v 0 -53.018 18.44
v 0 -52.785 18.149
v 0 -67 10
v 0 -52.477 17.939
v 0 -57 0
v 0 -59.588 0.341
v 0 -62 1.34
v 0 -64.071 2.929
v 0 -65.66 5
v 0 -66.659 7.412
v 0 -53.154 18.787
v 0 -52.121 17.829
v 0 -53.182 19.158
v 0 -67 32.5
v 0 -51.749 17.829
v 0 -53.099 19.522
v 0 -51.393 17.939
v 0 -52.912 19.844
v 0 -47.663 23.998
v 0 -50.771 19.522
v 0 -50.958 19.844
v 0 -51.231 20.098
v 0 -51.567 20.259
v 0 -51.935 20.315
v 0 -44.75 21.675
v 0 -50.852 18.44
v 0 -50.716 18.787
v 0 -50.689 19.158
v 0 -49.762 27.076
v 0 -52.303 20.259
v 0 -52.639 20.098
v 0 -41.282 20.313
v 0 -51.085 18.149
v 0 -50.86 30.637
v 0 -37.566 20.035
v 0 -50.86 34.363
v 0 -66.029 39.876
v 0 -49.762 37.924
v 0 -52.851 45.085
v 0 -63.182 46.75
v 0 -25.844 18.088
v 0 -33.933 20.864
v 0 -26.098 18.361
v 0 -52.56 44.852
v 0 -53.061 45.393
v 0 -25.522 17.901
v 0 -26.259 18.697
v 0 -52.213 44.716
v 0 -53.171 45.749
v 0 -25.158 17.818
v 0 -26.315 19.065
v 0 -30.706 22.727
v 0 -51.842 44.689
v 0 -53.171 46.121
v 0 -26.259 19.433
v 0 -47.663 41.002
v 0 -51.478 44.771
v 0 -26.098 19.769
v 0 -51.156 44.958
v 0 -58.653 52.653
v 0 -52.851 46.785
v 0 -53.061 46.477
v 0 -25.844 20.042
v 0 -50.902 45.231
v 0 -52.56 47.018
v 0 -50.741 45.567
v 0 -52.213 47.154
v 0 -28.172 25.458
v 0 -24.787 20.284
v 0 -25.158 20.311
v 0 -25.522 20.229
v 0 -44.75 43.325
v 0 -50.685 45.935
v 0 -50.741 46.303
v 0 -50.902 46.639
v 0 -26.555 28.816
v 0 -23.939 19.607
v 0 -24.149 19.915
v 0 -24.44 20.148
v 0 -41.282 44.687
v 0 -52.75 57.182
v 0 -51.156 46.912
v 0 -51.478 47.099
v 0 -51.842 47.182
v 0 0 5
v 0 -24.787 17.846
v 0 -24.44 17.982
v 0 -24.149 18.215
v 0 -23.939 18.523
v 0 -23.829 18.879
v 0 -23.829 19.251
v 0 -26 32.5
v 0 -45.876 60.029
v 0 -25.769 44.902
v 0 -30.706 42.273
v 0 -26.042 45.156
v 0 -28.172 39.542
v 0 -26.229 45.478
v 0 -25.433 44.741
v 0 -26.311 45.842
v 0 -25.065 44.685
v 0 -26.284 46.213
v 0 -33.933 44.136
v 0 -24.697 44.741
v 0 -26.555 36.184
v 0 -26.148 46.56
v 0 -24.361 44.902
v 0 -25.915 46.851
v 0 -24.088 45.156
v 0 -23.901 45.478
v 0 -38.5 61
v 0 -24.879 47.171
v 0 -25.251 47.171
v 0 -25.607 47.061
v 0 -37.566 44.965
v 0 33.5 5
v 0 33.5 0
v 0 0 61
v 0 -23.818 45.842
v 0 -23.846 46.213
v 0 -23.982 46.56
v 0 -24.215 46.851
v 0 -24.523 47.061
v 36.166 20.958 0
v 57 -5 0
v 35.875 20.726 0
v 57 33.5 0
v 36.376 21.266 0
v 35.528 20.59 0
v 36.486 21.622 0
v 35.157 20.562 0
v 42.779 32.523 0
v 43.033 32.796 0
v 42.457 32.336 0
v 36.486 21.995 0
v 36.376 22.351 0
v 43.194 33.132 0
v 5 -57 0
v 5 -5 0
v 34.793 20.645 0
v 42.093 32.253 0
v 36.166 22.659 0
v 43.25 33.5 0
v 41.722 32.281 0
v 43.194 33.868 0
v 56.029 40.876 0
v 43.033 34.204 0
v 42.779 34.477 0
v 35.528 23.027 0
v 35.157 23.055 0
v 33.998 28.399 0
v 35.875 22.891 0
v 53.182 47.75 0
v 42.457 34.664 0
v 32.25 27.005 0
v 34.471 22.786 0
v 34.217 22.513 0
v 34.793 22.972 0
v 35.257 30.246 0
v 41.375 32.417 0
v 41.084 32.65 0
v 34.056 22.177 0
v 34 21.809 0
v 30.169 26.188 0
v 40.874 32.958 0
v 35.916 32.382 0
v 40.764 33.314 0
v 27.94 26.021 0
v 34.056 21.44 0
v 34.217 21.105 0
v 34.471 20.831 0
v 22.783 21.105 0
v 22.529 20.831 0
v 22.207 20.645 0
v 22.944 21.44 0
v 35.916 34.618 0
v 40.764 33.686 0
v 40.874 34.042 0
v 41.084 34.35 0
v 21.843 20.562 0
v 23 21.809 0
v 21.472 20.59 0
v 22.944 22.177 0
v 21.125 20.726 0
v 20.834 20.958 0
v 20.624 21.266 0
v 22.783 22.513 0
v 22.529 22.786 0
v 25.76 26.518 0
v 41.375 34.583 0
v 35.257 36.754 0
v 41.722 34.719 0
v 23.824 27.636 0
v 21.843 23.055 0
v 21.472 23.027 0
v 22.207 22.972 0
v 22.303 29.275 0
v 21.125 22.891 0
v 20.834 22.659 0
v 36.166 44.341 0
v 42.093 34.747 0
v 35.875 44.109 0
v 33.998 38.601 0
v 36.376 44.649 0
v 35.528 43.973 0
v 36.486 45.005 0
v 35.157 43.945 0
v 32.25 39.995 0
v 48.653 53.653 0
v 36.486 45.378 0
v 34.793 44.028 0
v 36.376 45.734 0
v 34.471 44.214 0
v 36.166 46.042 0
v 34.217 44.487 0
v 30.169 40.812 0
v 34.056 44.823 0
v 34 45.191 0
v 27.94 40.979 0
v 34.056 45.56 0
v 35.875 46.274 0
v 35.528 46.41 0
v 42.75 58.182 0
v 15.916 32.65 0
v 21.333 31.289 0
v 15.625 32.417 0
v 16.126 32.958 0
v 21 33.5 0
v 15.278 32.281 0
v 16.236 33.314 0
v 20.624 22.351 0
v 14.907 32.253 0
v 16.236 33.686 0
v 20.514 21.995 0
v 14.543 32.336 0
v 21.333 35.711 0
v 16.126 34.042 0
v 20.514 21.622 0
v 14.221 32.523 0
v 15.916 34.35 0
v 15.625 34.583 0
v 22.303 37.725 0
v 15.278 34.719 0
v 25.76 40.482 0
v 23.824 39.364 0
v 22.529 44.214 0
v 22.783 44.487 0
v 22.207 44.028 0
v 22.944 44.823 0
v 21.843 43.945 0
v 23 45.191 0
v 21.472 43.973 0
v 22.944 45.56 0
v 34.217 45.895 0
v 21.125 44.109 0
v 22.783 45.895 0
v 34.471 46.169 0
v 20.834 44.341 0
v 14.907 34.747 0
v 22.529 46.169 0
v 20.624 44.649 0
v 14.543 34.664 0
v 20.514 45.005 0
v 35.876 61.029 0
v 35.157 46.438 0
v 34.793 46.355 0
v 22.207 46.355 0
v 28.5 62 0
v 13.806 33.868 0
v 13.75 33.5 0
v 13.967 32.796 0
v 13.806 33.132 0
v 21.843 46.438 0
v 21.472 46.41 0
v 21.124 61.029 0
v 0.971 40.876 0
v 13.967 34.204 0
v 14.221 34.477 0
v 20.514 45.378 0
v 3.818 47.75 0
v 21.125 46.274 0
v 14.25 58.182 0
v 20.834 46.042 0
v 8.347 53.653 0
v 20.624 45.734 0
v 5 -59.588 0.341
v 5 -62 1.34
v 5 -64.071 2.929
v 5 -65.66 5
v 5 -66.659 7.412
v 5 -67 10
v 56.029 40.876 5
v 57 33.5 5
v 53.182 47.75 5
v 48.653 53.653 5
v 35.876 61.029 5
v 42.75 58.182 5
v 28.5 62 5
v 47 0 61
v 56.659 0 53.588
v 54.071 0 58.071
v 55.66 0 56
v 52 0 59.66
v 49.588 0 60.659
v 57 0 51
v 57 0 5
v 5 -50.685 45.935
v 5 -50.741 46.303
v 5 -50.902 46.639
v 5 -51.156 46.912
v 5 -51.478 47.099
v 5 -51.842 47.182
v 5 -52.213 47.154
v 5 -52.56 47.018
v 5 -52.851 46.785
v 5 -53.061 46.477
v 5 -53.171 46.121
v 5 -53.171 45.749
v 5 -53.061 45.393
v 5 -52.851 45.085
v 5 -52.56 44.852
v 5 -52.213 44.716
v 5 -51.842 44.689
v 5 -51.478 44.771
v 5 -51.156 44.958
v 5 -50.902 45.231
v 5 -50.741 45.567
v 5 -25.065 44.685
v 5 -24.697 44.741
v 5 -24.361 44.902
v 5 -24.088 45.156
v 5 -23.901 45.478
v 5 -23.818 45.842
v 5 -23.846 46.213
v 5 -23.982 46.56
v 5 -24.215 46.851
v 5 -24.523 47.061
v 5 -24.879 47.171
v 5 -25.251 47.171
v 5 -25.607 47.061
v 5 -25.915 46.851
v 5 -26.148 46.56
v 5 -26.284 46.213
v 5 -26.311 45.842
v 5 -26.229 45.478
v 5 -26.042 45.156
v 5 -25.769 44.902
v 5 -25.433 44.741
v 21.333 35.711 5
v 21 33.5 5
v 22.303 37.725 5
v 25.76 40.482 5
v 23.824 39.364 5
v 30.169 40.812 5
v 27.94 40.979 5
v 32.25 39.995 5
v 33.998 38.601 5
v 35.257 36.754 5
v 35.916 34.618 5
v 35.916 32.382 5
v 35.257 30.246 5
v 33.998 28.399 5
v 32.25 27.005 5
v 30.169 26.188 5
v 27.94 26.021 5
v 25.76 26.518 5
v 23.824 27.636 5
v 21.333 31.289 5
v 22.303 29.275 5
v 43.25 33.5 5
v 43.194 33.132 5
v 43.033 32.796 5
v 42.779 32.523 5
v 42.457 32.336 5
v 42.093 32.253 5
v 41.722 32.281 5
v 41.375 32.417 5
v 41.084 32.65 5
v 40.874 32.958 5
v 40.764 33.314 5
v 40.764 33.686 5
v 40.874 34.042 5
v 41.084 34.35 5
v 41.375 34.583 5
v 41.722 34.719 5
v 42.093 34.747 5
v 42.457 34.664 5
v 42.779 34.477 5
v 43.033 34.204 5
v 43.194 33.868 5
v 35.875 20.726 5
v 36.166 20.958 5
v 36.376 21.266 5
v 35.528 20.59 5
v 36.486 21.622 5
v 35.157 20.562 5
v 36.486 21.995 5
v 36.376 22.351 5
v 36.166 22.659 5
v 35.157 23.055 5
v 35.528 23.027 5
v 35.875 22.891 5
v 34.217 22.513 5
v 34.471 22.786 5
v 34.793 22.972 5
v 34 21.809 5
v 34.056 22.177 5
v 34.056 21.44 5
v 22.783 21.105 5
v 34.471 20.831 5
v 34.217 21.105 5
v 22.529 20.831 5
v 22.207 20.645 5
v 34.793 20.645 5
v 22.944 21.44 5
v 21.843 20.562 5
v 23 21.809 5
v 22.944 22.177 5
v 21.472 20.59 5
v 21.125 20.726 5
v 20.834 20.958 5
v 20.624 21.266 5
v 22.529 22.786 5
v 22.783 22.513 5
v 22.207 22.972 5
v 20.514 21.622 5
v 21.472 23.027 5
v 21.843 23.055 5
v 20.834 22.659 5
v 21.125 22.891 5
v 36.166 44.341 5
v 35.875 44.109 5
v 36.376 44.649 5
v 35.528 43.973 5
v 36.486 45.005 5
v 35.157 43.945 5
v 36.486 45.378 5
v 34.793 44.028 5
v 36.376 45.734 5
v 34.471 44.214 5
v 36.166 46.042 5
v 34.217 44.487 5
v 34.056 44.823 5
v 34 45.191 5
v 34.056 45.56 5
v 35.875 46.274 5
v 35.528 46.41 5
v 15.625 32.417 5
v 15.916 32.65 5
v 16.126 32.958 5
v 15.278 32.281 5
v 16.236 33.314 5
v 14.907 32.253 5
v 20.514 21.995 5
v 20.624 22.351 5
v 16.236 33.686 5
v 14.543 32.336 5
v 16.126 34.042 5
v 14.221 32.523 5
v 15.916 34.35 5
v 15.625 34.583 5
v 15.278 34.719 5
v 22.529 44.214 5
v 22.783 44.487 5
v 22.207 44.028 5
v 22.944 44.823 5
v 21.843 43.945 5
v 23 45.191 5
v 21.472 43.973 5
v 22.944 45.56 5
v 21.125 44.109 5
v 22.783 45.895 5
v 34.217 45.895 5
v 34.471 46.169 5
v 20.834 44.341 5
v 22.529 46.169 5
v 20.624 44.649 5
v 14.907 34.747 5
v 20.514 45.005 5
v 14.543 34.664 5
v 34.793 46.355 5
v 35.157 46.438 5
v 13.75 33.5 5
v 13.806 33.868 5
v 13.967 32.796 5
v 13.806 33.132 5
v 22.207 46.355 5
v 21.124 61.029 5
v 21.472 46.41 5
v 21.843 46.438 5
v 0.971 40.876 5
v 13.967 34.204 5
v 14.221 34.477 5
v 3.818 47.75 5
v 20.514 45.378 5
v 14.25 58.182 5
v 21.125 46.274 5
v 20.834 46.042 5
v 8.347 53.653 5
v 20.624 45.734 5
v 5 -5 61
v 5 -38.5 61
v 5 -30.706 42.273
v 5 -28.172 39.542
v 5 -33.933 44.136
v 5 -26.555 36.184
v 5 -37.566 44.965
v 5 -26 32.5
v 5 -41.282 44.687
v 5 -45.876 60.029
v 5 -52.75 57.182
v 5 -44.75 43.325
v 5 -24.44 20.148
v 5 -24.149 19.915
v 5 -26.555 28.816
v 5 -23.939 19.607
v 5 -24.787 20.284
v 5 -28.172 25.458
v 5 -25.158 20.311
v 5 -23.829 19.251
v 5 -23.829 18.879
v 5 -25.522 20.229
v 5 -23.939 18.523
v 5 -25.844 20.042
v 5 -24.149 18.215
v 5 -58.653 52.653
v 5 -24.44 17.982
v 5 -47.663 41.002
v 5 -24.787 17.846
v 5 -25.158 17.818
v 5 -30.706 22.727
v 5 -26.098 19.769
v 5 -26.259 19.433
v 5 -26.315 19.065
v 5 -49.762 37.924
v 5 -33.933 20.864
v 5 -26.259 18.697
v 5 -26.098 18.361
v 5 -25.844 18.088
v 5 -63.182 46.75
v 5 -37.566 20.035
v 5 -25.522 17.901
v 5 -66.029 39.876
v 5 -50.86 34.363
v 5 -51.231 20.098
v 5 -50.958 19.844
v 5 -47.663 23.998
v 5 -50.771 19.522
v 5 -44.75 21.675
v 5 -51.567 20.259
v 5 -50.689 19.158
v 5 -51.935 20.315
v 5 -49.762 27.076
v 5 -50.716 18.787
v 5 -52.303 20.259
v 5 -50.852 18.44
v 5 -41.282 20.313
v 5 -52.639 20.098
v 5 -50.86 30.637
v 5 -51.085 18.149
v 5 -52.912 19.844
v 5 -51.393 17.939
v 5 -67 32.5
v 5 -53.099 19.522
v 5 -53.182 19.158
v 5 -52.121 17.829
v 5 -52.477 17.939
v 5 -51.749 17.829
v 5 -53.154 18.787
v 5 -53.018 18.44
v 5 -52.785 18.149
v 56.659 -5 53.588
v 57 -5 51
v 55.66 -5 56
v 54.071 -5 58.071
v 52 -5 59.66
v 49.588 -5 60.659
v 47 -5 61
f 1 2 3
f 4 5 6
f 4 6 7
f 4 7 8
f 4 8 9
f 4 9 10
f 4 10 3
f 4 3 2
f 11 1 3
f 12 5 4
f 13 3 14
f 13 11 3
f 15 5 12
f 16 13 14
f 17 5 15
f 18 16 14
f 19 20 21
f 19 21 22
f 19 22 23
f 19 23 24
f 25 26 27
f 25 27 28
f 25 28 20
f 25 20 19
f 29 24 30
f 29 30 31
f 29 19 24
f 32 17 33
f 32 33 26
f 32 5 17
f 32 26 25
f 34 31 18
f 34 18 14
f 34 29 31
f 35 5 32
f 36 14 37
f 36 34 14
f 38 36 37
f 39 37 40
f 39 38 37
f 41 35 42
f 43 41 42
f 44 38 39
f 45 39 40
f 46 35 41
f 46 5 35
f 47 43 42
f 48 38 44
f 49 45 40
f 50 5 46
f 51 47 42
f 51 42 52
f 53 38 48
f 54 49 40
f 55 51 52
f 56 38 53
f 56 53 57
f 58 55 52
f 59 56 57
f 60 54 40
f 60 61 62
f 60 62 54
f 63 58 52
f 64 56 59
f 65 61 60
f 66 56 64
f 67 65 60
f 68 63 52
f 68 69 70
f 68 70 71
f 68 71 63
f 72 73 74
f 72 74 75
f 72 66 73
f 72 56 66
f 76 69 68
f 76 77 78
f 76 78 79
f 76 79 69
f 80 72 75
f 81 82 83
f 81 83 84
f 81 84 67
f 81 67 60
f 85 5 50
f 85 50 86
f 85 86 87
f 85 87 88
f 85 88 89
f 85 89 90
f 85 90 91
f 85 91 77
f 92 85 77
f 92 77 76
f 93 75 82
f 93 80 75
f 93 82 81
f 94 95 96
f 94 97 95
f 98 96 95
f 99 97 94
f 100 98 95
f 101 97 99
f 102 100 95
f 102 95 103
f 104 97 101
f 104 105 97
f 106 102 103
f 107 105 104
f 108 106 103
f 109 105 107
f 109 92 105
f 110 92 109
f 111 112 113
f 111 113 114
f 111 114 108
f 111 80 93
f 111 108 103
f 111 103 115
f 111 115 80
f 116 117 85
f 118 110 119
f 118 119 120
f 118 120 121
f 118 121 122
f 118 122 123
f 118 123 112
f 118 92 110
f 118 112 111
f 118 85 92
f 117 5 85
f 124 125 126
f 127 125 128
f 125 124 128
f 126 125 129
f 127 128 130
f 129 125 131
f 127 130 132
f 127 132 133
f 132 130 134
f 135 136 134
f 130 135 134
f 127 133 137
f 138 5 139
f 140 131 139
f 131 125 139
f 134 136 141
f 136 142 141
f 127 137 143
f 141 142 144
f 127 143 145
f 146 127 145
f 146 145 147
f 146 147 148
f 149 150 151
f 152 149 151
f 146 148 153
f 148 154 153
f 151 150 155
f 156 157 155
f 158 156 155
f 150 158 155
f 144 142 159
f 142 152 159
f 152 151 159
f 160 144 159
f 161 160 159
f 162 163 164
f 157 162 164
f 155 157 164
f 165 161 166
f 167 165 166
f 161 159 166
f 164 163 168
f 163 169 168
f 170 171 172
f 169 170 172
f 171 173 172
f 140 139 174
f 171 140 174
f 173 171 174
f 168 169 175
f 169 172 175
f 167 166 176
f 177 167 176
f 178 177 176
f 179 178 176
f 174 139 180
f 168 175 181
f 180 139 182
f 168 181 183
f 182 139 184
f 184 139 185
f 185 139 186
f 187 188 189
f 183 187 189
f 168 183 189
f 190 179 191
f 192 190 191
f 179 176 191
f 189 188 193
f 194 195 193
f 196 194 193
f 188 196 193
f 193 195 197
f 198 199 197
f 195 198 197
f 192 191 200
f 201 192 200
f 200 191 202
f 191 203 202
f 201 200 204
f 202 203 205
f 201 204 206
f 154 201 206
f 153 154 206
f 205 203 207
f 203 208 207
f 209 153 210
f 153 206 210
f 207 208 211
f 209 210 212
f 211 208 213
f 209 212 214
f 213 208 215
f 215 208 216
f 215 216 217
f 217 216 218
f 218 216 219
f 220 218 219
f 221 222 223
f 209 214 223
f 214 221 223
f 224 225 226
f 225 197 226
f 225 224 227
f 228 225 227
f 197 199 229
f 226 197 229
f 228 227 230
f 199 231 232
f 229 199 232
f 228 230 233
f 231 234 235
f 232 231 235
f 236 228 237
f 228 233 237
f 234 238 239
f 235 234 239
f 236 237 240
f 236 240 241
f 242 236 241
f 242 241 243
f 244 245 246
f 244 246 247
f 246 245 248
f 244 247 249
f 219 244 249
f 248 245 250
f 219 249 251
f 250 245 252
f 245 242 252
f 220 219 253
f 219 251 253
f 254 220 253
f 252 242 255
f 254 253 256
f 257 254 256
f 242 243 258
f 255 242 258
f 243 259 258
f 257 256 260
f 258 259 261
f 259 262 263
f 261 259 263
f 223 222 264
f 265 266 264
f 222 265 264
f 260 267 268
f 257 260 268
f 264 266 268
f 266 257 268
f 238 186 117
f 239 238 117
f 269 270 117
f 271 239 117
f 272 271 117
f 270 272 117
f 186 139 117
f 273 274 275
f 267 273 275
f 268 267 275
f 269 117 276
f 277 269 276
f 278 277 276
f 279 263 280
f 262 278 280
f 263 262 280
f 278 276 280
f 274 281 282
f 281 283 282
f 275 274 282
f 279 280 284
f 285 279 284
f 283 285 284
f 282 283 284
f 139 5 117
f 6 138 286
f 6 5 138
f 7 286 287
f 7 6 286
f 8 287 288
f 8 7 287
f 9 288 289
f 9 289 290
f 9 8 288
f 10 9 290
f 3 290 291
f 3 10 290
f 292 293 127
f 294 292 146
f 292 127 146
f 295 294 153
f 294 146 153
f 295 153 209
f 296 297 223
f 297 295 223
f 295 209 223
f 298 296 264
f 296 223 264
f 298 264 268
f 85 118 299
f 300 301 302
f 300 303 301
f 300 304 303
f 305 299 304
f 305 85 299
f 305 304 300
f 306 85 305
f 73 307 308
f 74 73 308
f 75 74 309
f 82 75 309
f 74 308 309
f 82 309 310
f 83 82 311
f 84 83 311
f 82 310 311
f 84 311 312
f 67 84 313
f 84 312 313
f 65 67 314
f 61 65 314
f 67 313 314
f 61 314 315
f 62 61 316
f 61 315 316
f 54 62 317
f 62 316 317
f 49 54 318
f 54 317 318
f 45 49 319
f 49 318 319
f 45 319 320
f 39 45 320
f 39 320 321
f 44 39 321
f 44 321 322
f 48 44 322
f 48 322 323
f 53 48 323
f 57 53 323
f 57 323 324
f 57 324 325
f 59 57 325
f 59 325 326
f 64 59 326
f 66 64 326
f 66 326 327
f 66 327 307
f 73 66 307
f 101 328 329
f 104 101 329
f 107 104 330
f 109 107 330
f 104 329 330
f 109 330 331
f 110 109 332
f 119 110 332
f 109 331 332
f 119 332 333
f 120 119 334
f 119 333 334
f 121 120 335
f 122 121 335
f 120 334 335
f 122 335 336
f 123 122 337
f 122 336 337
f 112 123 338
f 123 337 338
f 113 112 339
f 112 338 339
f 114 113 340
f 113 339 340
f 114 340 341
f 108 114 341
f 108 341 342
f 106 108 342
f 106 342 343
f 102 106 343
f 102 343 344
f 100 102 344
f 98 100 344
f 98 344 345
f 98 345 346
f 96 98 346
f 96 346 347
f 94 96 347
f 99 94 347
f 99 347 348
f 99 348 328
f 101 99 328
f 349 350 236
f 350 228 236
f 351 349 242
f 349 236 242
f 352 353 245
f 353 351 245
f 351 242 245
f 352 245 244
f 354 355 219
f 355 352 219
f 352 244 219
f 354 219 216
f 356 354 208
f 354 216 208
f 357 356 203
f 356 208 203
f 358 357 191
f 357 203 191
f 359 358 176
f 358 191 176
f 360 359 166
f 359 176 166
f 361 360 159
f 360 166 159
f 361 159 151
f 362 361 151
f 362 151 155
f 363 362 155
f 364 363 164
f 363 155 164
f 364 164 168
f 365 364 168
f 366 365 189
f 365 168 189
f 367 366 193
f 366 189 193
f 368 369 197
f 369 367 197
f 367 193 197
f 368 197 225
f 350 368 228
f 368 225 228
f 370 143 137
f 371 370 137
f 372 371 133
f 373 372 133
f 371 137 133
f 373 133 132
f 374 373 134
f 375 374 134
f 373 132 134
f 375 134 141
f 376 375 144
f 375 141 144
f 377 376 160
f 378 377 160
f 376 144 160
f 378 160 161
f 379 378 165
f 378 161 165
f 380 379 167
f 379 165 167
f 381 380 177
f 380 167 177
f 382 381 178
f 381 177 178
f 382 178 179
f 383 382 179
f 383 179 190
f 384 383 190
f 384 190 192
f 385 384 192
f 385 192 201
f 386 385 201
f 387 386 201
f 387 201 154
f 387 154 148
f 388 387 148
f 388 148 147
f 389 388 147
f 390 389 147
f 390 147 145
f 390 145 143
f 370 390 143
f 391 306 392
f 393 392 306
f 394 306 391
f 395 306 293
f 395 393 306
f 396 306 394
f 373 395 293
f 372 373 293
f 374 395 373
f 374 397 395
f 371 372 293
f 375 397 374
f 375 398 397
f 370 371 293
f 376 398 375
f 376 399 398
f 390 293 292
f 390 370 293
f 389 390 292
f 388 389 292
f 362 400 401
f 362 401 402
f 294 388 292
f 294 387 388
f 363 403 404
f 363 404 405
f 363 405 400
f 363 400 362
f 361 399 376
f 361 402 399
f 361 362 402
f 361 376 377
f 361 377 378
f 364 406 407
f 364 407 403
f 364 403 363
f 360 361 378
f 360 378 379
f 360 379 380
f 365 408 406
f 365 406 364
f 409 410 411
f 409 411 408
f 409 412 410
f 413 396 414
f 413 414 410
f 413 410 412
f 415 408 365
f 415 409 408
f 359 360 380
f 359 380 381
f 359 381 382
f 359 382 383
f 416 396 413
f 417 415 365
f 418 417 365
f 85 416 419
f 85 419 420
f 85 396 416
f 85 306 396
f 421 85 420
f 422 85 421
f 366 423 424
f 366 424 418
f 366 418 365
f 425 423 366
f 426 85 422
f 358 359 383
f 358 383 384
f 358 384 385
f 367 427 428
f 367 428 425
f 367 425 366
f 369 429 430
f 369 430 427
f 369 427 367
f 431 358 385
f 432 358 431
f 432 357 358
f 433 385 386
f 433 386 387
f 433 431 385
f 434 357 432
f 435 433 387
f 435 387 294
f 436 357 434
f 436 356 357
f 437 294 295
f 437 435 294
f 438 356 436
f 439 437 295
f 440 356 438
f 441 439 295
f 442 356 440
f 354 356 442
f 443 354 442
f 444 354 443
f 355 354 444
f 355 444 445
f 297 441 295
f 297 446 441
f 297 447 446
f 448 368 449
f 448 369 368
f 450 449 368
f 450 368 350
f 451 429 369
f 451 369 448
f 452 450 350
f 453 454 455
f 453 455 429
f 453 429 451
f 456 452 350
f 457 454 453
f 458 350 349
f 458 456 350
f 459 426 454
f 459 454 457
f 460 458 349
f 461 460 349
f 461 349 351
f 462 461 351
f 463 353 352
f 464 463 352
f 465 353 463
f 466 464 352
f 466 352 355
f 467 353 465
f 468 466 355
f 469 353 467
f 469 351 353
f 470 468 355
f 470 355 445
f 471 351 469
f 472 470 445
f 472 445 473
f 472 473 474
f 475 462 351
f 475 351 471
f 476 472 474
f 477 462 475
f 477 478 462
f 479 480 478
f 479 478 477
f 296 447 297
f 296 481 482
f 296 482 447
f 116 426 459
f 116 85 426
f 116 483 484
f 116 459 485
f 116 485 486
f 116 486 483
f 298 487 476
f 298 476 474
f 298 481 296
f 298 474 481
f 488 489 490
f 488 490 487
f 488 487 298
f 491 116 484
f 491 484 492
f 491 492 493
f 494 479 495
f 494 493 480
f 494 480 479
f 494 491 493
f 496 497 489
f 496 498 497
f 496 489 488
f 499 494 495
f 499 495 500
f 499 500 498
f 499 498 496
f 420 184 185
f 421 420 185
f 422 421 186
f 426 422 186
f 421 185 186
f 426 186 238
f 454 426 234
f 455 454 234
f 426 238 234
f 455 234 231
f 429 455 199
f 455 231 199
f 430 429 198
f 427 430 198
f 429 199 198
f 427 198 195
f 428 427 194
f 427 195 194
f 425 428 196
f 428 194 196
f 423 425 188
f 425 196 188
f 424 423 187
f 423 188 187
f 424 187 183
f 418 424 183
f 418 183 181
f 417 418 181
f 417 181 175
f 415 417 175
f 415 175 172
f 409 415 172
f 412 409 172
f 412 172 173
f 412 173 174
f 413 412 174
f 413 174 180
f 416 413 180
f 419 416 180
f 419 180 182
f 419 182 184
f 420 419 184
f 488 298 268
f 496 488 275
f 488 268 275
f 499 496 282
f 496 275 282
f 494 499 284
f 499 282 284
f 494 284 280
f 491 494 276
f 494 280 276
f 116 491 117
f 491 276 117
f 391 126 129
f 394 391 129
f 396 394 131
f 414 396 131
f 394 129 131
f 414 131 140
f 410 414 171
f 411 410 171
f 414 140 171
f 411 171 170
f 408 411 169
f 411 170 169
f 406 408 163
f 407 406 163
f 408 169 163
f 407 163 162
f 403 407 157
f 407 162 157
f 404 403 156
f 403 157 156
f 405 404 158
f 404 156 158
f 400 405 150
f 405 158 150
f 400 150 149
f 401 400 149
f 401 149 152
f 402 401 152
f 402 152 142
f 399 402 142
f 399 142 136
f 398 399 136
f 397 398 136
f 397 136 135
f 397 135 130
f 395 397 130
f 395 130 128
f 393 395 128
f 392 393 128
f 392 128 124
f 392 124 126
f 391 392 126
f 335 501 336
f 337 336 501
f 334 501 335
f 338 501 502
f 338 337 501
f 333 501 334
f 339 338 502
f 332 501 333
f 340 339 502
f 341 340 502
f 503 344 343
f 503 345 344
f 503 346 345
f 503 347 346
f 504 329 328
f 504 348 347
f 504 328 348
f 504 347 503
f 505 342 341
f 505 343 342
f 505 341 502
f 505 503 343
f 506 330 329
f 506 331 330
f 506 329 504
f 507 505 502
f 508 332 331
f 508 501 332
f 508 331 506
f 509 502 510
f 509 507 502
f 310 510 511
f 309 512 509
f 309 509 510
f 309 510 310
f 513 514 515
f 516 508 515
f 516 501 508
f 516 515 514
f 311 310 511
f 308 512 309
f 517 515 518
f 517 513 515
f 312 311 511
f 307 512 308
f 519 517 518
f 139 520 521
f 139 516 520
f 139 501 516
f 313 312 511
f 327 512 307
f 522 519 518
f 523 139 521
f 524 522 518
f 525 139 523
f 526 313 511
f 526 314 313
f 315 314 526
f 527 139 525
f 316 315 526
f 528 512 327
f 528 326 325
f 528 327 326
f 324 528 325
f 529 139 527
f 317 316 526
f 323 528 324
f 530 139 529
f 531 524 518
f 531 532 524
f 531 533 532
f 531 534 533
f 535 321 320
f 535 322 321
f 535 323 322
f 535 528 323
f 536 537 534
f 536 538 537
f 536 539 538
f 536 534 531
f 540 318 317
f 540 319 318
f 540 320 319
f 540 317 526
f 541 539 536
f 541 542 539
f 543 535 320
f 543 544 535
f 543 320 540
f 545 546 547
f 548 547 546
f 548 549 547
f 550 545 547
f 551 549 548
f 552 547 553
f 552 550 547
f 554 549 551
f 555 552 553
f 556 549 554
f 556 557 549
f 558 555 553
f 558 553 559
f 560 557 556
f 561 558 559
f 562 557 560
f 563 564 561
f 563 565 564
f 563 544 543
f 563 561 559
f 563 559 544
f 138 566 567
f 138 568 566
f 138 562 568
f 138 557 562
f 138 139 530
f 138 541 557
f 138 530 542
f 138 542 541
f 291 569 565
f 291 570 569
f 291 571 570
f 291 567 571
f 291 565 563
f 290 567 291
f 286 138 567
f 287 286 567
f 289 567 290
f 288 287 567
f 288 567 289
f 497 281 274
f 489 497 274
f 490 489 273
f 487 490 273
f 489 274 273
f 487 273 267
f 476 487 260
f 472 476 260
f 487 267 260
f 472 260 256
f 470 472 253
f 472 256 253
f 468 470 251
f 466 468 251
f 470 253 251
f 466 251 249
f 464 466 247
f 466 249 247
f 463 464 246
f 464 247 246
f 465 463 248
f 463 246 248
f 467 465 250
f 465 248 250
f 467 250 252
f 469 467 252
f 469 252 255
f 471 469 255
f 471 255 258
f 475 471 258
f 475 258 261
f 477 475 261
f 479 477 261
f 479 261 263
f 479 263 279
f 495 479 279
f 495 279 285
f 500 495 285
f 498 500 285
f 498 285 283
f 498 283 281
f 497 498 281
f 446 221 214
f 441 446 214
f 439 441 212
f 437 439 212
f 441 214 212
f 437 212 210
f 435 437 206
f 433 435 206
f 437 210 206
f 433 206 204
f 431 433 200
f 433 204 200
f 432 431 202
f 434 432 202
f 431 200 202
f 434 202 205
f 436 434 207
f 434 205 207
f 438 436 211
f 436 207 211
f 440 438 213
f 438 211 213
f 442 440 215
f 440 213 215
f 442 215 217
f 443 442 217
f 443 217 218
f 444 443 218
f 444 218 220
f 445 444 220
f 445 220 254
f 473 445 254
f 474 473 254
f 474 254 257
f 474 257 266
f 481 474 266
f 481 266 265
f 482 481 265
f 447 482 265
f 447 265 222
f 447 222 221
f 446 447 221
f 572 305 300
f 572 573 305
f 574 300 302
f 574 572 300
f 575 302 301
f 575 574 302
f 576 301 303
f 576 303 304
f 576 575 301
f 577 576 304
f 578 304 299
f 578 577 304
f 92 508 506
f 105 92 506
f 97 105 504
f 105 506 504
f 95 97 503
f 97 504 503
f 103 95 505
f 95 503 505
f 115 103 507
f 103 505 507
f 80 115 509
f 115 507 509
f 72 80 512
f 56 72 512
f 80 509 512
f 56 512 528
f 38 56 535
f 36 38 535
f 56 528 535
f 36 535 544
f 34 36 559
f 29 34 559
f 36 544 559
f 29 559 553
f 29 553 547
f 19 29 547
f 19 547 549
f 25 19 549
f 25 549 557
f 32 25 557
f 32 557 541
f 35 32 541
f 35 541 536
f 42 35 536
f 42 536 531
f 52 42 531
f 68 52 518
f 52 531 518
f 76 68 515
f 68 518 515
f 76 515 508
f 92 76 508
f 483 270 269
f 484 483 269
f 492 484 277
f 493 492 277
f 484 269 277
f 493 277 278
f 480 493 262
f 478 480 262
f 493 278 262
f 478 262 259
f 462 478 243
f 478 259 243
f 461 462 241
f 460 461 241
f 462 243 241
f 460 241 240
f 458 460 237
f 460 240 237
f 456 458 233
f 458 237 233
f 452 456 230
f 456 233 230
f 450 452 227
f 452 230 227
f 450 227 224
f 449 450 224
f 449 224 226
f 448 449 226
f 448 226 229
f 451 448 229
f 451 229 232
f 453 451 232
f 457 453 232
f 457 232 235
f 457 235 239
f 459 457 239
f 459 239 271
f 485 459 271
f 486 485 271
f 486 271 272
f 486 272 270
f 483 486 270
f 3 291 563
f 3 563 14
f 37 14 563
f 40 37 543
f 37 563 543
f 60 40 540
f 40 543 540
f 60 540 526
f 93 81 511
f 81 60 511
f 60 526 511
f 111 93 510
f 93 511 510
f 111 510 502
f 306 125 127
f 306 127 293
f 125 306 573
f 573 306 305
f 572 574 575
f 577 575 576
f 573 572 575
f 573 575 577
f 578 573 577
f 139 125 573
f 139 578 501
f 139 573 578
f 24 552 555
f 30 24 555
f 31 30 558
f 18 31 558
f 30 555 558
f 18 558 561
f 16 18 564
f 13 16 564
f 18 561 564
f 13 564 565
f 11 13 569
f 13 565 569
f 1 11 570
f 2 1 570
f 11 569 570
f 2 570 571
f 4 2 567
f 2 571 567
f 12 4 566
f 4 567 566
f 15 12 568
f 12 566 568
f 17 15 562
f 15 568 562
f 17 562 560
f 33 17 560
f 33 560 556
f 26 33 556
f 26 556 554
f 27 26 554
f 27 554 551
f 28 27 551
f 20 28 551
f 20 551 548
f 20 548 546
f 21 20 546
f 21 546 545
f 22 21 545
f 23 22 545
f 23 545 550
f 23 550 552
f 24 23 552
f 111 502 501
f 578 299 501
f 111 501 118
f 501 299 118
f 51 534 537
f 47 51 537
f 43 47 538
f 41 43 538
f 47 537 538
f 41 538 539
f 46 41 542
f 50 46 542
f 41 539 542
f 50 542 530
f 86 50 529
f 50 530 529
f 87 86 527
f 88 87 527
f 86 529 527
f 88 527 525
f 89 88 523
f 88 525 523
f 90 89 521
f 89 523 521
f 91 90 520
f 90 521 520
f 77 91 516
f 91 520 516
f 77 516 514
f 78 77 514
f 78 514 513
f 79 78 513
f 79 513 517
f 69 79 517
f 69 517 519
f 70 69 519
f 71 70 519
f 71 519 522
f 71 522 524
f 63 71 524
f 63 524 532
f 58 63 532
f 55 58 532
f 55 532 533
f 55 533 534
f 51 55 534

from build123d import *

# Parameters (mm, degrees)
EXTRUDE_1_DEPTH          = 61
SKETCH_3_W               = 5
SKETCH_3_H               = 62
EXTRUDE_2_DEPTH          = 57
CUT_EXTRUDE_11_DEPTH     = 10
SKETCH_16_R              = 7.5
SKETCH_16_R_2            = 1.25
CUT_EXTRUDE_12_DEPTH     = 10
PATTERN_CIRCULAR_7_COUNT = 6
CUT_EXTRUDE_13_DEPTH     = 10
FILLET_2_R               = 10
SKETCH_18_R              = 12.5
SKETCH_18_R_2            = 1.25
CUT_EXTRUDE_14_DEPTH     = 10
PATTERN_CIRCULAR_8_COUNT = 4


with BuildPart() as part:
    # 草图1 → 凸台-拉伸1 (new body)
    with BuildSketch(Plane.XY):
        Polygon((0, 0), (57, 0), (57, -5), (5, -5), (5, -67), (0, -67), (0, -10.157289975), align=None)
    extrude(amount=EXTRUDE_1_DEPTH)

    # 草图3 → 凸台-拉伸2 (add)
    with BuildSketch(Plane.ZY):
        with Locations((2.5, 31)):
            Rectangle(SKETCH_3_W, SKETCH_3_H)
    extrude(amount=-EXTRUDE_2_DEPTH)

    # 草图15 → 切除-拉伸11 (cut)
    with BuildSketch(Plane(origin=(0, 0, 0), x_dir=(-1, 0, 0), z_dir=(0, 0, -1))):
        with BuildLine():
            ThreePointArc((-57, 33.5), (-48.652543264, 53.652543264), (-28.5, 62))
            Line((-28.5, 62), (-57, 62))
            Line((-57, 62), (-57, 33.5))
        make_face()
        with BuildLine():
            Line((0, 33.5), (0, 62))
            Line((0, 62), (-28.5, 62))
            ThreePointArc((-28.5, 62), (-8.347456736, 53.652543264), (0, 33.5))
        make_face()
    extrude(amount=-CUT_EXTRUDE_11_DEPTH, mode=Mode.SUBTRACT)

    # 草图16 → 切除-拉伸12 (cut)
    with BuildSketch(Plane(origin=(0, 0, 0), x_dir=(-1, 0, 0), z_dir=(0, 0, -1))):
        with Locations((-28.5, 33.5)):
            Circle(SKETCH_16_R)
        with Locations((-15, 33.5)):
            Circle(SKETCH_16_R_2)
    cut_extrude_12 = extrude(amount=-CUT_EXTRUDE_12_DEPTH, mode=Mode.SUBTRACT)

    # 阵列(圆周)7: 切除-拉伸12 ×6 about axis
    pattern_circular_7_axis = Axis((28.5, 33.5, 0), (0, 0, 1))
    for i in range(1, PATTERN_CIRCULAR_7_COUNT):
        add(cut_extrude_12.rotate(pattern_circular_7_axis, i * 360 / PATTERN_CIRCULAR_7_COUNT), mode=Mode.SUBTRACT)

    # 草图17 → 切除-拉伸13 (cut)
    with BuildSketch(Plane(origin=(5, 0, 0), x_dir=(0, 0, -1), z_dir=(1, 0, 0))):
        with BuildLine():
            Line((-61, -38.5), (-61, -67))
            Line((-61, -67), (-32.5, -67))
            ThreePointArc((-32.5, -67), (-52.652543264, -58.652543264), (-61, -38.5))
        make_face()
    extrude(amount=-CUT_EXTRUDE_13_DEPTH, mode=Mode.SUBTRACT)

    # 圆角2
    fillet_2_edges = [part.edges().sort_by_distance(p)[0] for p in [
        (57, -2.5, 61),
        (2.5, -67, 0),
    ]]
    fillet(fillet_2_edges, radius=FILLET_2_R)

    # 草图18 → 切除-拉伸14 (cut)
    with BuildSketch(Plane(origin=(5, 0, 0), x_dir=(0, 0, -1), z_dir=(1, 0, 0))):
        with Locations(Location((-32.5, -38.5, 0), (0, 0, 90))):
            Circle(SKETCH_18_R)
        with Locations(Location((-45.935028843, -51.935028843, 0), (0, 0, 90))):
            Circle(SKETCH_18_R_2)
    cut_extrude_14 = extrude(amount=-CUT_EXTRUDE_14_DEPTH, mode=Mode.SUBTRACT)

    # 阵列(圆周)8: 切除-拉伸14 ×4 about axis
    pattern_circular_8_axis = Axis((0, -38.5, 32.5), (1, 0, 0))
    for i in range(1, PATTERN_CIRCULAR_8_COUNT):
        add(cut_extrude_14.rotate(pattern_circular_8_axis, i * 360 / PATTERN_CIRCULAR_8_COUNT), mode=Mode.SUBTRACT)


solid = part.part
